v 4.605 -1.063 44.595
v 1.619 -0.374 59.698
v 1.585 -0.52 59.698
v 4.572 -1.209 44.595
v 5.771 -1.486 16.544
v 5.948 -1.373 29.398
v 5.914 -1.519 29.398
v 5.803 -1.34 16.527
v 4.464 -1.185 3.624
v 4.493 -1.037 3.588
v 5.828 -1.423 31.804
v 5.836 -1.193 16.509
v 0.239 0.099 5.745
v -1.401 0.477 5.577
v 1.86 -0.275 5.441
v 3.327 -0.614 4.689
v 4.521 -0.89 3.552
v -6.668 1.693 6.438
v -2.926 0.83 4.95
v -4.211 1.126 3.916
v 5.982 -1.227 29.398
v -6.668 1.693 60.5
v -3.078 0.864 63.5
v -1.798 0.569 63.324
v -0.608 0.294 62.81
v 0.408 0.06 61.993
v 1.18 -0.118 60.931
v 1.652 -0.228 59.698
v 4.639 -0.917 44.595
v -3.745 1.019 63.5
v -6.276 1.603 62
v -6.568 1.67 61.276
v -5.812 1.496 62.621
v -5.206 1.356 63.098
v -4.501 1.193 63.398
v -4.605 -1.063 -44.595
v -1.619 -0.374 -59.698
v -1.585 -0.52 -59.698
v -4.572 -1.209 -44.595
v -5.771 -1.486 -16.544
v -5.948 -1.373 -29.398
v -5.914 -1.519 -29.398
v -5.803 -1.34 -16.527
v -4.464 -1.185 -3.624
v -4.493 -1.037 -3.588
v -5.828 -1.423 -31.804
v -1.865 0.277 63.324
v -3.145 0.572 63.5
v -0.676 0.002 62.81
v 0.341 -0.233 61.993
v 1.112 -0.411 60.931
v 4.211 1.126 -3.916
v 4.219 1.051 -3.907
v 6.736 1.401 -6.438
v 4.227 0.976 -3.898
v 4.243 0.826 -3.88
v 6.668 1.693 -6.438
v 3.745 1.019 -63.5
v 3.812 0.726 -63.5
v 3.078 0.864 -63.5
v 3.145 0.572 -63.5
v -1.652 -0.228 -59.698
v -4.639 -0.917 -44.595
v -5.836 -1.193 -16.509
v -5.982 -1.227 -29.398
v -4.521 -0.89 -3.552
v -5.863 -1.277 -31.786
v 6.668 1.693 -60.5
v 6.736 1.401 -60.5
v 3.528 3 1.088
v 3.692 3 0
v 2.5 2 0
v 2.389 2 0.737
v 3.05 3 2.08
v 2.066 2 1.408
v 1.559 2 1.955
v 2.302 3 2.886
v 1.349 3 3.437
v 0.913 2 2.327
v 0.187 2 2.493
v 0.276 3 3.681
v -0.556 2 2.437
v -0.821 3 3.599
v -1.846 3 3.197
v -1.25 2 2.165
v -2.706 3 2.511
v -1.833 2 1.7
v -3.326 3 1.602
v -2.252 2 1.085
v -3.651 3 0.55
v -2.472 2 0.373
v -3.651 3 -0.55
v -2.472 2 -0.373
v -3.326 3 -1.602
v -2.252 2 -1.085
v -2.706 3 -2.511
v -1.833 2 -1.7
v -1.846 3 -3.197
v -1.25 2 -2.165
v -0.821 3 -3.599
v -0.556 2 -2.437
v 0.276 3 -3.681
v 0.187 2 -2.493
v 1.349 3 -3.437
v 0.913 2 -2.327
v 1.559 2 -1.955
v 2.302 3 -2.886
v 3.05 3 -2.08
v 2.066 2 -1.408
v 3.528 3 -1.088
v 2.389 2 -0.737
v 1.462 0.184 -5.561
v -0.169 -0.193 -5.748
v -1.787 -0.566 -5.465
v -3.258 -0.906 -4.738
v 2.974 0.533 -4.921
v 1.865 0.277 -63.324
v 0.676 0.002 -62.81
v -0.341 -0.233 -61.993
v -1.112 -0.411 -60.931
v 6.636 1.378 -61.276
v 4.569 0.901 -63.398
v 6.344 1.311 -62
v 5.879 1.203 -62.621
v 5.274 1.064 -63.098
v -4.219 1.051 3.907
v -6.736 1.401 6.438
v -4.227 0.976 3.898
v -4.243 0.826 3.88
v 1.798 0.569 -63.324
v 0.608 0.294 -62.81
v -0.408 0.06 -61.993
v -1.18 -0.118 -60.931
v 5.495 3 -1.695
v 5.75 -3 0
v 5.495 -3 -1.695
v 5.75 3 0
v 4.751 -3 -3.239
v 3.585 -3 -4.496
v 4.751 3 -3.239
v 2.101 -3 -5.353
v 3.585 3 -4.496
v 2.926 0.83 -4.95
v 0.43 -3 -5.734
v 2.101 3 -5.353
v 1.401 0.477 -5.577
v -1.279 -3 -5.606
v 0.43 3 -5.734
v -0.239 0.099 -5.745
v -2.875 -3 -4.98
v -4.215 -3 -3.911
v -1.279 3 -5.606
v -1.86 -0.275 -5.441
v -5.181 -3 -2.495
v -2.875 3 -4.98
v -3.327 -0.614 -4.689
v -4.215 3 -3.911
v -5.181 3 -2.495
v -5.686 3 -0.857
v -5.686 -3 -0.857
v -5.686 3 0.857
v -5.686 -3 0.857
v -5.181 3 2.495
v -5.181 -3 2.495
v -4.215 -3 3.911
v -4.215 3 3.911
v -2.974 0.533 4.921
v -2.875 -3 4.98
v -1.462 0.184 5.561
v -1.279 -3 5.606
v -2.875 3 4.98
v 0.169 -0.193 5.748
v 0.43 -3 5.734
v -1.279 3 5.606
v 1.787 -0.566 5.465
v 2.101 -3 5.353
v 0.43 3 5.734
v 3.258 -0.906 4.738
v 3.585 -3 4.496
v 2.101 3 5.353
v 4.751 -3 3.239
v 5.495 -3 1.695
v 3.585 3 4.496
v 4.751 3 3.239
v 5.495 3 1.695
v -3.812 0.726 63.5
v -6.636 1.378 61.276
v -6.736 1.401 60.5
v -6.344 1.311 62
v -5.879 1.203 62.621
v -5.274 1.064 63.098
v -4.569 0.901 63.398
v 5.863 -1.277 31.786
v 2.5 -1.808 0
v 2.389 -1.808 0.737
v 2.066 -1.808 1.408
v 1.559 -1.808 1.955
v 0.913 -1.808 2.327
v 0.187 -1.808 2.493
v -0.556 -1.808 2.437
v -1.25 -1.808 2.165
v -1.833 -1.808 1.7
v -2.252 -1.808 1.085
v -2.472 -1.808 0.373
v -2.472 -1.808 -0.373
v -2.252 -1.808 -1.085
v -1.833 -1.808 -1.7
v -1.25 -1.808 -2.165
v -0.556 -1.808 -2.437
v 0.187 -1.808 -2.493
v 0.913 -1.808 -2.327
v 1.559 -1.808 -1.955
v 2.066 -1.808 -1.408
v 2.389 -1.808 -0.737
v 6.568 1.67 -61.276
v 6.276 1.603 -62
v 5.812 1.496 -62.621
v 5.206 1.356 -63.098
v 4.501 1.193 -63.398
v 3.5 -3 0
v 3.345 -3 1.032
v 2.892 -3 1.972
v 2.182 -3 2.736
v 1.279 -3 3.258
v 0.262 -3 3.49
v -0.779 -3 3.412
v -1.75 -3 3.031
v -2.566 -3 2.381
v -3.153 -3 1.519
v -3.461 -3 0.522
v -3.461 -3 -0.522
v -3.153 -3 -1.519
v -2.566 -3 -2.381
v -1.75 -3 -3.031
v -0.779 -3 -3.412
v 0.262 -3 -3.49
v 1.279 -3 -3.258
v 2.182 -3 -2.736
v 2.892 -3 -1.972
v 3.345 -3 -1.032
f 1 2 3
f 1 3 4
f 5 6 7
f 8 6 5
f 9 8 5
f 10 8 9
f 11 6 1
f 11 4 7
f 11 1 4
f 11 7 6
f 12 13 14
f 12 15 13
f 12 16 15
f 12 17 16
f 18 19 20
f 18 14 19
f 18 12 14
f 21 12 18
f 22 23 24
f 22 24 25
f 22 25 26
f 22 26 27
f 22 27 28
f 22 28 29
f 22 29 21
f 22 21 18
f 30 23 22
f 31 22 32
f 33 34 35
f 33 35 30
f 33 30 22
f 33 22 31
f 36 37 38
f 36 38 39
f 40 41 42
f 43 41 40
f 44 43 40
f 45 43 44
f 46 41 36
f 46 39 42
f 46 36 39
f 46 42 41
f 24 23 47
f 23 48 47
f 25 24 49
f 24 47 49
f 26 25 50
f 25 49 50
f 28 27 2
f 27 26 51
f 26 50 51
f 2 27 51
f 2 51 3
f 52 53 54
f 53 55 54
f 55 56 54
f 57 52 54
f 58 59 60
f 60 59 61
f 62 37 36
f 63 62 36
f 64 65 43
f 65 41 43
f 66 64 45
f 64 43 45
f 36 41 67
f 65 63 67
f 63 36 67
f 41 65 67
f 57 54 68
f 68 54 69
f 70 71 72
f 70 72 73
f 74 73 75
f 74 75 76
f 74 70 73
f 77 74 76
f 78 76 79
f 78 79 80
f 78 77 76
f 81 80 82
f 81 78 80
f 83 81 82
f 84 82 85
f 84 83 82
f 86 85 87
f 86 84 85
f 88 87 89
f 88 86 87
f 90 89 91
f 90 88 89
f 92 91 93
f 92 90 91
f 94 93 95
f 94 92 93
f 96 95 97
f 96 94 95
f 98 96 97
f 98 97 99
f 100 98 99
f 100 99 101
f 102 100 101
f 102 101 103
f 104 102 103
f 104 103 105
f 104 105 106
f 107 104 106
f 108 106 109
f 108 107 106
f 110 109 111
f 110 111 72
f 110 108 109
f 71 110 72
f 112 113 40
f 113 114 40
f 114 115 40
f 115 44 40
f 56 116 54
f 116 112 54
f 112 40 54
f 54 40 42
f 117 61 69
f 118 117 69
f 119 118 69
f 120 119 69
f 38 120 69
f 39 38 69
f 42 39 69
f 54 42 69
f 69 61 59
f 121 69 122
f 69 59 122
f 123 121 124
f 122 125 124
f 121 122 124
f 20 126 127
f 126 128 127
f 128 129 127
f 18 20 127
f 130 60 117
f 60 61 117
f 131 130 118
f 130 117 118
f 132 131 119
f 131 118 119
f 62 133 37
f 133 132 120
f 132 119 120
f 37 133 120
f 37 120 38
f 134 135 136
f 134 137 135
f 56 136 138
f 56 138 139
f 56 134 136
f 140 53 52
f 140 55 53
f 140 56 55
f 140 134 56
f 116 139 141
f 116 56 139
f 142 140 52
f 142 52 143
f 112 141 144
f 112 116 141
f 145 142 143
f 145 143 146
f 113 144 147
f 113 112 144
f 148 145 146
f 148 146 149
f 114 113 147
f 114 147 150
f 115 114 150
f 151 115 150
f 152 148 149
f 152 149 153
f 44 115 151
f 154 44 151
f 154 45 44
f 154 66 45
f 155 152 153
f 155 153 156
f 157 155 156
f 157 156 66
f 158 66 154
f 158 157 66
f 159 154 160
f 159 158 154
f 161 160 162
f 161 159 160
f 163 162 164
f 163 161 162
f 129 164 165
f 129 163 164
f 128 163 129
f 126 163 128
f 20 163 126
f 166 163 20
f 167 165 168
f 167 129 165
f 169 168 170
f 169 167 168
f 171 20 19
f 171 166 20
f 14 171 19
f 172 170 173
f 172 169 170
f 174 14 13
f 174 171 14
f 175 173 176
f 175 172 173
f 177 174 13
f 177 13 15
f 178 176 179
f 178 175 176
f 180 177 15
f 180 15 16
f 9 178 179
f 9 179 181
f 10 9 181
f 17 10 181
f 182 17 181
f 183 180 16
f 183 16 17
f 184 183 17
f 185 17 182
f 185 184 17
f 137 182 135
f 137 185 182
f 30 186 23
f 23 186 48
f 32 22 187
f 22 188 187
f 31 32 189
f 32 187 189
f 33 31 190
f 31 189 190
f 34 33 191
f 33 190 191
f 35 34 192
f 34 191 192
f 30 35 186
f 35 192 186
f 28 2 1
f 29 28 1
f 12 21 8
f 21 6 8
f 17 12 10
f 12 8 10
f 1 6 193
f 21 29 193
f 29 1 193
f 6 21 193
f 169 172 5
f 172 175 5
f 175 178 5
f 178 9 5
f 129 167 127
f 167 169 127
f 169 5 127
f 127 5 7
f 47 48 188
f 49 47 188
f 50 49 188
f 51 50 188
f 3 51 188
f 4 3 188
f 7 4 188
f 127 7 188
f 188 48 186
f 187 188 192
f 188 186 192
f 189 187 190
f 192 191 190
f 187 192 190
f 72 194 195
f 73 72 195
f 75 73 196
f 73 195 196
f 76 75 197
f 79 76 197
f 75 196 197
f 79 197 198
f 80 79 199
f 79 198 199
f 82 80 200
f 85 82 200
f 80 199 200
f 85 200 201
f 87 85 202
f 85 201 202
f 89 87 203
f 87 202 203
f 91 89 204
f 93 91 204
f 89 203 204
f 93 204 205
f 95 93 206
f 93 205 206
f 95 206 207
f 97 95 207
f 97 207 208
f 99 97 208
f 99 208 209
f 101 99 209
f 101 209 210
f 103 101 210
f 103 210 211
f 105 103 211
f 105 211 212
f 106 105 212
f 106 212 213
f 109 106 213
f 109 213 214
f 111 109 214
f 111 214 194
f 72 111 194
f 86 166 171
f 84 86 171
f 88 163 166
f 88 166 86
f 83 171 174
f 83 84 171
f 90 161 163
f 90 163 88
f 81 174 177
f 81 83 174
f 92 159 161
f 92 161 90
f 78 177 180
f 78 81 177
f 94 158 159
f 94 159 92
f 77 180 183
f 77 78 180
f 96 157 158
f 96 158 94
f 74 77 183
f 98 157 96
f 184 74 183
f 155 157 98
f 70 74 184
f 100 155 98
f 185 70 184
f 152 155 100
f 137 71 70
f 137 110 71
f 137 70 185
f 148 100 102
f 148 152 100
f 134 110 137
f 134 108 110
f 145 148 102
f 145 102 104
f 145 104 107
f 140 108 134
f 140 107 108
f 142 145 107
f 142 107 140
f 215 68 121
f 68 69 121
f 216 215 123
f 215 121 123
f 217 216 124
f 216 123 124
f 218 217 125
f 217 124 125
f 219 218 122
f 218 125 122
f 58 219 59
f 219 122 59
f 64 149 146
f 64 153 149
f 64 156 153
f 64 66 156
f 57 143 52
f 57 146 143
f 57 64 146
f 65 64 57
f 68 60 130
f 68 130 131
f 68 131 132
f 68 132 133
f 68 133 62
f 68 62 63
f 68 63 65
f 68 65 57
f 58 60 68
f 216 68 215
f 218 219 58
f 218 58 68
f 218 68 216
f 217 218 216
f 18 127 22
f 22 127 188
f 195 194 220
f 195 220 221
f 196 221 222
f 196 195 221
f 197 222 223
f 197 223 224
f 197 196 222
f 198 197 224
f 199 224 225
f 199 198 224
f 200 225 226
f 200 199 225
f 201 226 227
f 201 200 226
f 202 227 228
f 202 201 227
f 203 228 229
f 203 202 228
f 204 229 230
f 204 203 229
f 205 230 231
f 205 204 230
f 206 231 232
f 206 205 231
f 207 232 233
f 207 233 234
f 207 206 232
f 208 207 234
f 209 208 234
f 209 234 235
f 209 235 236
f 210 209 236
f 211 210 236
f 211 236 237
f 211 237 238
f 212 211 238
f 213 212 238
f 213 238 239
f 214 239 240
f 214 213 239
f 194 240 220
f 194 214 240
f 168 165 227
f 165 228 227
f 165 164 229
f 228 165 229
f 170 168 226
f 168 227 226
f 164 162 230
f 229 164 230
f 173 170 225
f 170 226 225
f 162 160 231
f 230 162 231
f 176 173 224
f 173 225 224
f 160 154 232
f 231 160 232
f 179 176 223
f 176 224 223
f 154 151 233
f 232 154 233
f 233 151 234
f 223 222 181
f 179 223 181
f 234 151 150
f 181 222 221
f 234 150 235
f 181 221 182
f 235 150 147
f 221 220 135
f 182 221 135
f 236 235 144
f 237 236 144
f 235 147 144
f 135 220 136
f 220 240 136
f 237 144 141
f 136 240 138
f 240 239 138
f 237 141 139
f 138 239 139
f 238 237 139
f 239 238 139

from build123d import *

# Parameters (mm, degrees)
SKETCH1_R             = 5.75
BOSS_EXTRUDE1_DEPTH   = 3
BOSS_EXTRUDE2_DEPTH   = 0.15
CIRPATTERN1_COUNT     = 2
SKETCH4_R             = 2.5
CUT_EXTRUDE1_DEPTH    = 7.0000001
CHAMFER1_SIZE         = 1
CHAMFER1_SIZE2        = 1.191753593
CHAMFER1_PART_2_SIZE  = 1
CHAMFER1_PART_2_SIZE2 = 1.191753593


with BuildPart() as part:
    # Sketch1 → Boss-Extrude1 (new body, symmetric)
    with BuildSketch(Plane(origin=(0, 0, 0), x_dir=(1, 0, 0), z_dir=(0, 1, 0))):
        Circle(SKETCH1_R)
    extrude(amount=BOSS_EXTRUDE1_DEPTH, both=True)

    # Sketch3 → Boss-Extrude2 (add, symmetric)
    with BuildSketch(Plane(origin=(0, 0, 0), x_dir=(0.974370065, -0.224951054, 0), z_dir=(-0.224951054, -0.974370065, 0))):
        with BuildLine():
            Line((-3.842130485, 3.401744966), (-6.87806753, 6.437682011))
            Line((-6.87806753, 6.437682011), (-6.87806753, 60.5))
            ThreePointArc((-6.87806753, 60.5), (-5.999387873, 62.621320344), (-3.87806753, 63.5))
            Line((-3.87806753, 63.5), (-3.193113424, 63.5))
            ThreePointArc((-3.193113424, 63.5), (-0.110101392, 62.436373561), (1.661241396, 59.698014726))
            add(Edge.make_bspline(
                [(1.661241396, 59.698014726), (9.030851791, 31.313089237), (4.404985301, 2.253493698)],
                knots=[0, 0, 0, 1, 1, 1], degree=2))
            add(Edge.make_bspline(
                [(-3.842130485, 3.401744966), (0.406766217, 7.300677946), (4.404985301, 2.253493698)],
                knots=[0, 0, 0, 1, 1, 1], degree=2))
        make_face()
    boss_extrude2 = extrude(amount=BOSS_EXTRUDE2_DEPTH, both=True)

    # CirPattern1: Boss-Extrude2 ×2 about axis
    cirpattern1_axis = Axis((0, 3, 0), (0, -1, 0))
    for i in range(1, CIRPATTERN1_COUNT):
        add(boss_extrude2.rotate(cirpattern1_axis, i * 360 / CIRPATTERN1_COUNT))

    # Sketch4 → Cut-Extrude1 (cut, through all)
    with BuildSketch(Plane.XZ.offset(3)):
        Circle(SKETCH4_R)
    extrude(amount=-CUT_EXTRUDE1_DEPTH, mode=Mode.SUBTRACT)

    # Chamfer1
    chamfer1_edges = [part.edges().sort_by_distance(p)[0] for p in [
        (-2.5, 3, 0),
    ]]
    chamfer1_side = [part.faces().sort_by_distance(p)[0] for p in [
        (-2.5, 0, 0),
    ]]
    chamfer(chamfer1_edges, length=CHAMFER1_SIZE, length2=CHAMFER1_SIZE2, reference=chamfer1_side[0])

    # Chamfer1 part 2
    chamfer1_part_2_edges = [part.edges().sort_by_distance(p)[0] for p in [
        (-2.5, -3, 0),
    ]]
    chamfer1_part_2_side = [part.faces().sort_by_distance(p)[0] for p in [
        (-5.58736544, -3, 0),
    ]]
    chamfer(chamfer1_part_2_edges, length=CHAMFER1_PART_2_SIZE, length2=CHAMFER1_PART_2_SIZE2, reference=chamfer1_part_2_side[0])


solid = part.part
